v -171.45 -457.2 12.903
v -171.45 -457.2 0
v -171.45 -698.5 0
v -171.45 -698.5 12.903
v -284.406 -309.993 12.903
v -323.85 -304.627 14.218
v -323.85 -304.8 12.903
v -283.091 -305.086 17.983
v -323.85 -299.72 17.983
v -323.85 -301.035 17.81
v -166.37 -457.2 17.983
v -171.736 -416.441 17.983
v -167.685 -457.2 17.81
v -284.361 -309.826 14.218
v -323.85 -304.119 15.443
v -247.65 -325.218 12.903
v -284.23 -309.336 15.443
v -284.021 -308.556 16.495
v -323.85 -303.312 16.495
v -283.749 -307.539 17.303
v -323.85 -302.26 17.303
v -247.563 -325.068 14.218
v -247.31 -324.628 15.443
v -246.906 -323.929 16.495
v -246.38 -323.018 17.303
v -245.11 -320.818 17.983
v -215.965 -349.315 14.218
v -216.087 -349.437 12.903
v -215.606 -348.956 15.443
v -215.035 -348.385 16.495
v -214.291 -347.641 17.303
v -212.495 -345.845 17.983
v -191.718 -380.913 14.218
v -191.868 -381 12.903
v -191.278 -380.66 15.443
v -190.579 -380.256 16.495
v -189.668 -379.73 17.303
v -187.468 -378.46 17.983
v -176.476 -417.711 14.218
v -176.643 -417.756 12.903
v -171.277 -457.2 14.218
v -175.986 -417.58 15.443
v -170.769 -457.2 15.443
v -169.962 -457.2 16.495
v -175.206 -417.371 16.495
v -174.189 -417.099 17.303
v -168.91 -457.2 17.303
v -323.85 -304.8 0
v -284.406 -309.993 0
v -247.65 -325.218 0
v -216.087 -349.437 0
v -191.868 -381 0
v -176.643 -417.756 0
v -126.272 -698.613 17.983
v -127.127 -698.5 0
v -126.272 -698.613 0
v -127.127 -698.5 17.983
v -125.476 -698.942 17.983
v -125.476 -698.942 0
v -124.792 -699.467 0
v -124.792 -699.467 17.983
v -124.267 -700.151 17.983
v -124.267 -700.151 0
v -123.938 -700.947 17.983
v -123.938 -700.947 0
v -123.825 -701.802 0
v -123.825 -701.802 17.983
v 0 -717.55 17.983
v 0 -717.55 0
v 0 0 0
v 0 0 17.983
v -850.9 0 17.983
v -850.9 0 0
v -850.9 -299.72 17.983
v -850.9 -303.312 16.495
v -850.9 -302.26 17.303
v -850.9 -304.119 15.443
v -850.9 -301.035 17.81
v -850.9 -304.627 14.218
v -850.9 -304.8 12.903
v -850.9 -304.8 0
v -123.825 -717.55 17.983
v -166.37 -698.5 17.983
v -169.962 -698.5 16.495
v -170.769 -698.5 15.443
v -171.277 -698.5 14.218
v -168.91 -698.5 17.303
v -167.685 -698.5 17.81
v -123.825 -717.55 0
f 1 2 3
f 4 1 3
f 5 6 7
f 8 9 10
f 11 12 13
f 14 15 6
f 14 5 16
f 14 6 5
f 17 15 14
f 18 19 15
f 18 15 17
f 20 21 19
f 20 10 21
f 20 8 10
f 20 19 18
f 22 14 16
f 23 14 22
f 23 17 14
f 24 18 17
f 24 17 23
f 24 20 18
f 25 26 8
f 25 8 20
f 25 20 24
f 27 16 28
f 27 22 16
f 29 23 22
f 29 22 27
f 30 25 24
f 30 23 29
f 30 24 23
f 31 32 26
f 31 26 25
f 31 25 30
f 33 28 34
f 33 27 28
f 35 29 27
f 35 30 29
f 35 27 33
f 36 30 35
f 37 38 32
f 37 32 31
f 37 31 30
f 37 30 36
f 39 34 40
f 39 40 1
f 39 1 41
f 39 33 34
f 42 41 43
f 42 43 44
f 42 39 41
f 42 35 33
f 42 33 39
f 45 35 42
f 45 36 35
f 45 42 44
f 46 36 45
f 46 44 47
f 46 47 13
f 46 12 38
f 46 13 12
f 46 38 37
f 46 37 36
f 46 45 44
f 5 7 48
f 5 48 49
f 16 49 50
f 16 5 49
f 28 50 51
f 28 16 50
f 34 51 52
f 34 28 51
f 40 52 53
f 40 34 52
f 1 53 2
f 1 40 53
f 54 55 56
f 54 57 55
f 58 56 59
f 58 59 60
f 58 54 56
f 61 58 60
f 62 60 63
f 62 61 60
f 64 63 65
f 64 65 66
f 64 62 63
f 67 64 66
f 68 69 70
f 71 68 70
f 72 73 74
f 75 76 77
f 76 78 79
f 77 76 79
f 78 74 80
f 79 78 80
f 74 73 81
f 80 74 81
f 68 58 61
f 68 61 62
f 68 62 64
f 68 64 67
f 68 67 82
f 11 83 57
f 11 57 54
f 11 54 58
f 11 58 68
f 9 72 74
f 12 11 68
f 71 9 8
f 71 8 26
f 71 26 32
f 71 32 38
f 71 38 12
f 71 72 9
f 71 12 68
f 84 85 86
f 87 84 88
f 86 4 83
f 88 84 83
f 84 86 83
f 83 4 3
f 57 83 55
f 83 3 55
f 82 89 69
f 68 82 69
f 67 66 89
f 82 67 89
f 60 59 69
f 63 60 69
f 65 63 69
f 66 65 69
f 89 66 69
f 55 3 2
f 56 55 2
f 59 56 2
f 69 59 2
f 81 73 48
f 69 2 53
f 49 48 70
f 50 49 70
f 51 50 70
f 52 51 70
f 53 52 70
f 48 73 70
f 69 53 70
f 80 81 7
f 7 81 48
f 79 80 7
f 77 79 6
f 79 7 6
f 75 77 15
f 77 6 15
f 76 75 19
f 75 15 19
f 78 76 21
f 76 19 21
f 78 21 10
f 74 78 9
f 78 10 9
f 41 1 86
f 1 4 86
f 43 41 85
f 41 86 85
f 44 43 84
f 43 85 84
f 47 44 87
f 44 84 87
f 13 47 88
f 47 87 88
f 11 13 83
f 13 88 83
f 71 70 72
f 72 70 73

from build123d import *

# Parameters (mm, degrees)
F1_DEPTH = 17.9832
F2_R     = 152.4
F3_R     = 3.302
F4_R     = 5.08


with BuildPart() as f1:
    # F0 (on Top) → F1 (new body)
    with BuildSketch(Plane.XY):
        Polygon((-123.825, -698.5), (-123.825, -717.55), (0, -717.55), (0, 0), (-850.9, 0), (-850.9, -304.8), (-171.45, -304.8), (-171.45, -698.5), align=None)
    extrude(amount=F1_DEPTH)

    # F2
    f2_edges = [f1.edges().sort_by_distance(p)[0] for p in [
        (-171.45, -304.8, 8.9916),
    ]]
    fillet(f2_edges, radius=F2_R)

    # F3
    f3_edges = [f1.edges().sort_by_distance(p)[0] for p in [
        (-123.825, -698.5, 8.9916),
    ]]
    fillet(f3_edges, radius=F3_R)

    # F4
    f4_edges = [f1.edges().sort_by_distance(p)[0] for p in [
        (-171.45, -577.85, 17.9832),
    ]]
    fillet(f4_edges, radius=F4_R)


solid = f1.part
